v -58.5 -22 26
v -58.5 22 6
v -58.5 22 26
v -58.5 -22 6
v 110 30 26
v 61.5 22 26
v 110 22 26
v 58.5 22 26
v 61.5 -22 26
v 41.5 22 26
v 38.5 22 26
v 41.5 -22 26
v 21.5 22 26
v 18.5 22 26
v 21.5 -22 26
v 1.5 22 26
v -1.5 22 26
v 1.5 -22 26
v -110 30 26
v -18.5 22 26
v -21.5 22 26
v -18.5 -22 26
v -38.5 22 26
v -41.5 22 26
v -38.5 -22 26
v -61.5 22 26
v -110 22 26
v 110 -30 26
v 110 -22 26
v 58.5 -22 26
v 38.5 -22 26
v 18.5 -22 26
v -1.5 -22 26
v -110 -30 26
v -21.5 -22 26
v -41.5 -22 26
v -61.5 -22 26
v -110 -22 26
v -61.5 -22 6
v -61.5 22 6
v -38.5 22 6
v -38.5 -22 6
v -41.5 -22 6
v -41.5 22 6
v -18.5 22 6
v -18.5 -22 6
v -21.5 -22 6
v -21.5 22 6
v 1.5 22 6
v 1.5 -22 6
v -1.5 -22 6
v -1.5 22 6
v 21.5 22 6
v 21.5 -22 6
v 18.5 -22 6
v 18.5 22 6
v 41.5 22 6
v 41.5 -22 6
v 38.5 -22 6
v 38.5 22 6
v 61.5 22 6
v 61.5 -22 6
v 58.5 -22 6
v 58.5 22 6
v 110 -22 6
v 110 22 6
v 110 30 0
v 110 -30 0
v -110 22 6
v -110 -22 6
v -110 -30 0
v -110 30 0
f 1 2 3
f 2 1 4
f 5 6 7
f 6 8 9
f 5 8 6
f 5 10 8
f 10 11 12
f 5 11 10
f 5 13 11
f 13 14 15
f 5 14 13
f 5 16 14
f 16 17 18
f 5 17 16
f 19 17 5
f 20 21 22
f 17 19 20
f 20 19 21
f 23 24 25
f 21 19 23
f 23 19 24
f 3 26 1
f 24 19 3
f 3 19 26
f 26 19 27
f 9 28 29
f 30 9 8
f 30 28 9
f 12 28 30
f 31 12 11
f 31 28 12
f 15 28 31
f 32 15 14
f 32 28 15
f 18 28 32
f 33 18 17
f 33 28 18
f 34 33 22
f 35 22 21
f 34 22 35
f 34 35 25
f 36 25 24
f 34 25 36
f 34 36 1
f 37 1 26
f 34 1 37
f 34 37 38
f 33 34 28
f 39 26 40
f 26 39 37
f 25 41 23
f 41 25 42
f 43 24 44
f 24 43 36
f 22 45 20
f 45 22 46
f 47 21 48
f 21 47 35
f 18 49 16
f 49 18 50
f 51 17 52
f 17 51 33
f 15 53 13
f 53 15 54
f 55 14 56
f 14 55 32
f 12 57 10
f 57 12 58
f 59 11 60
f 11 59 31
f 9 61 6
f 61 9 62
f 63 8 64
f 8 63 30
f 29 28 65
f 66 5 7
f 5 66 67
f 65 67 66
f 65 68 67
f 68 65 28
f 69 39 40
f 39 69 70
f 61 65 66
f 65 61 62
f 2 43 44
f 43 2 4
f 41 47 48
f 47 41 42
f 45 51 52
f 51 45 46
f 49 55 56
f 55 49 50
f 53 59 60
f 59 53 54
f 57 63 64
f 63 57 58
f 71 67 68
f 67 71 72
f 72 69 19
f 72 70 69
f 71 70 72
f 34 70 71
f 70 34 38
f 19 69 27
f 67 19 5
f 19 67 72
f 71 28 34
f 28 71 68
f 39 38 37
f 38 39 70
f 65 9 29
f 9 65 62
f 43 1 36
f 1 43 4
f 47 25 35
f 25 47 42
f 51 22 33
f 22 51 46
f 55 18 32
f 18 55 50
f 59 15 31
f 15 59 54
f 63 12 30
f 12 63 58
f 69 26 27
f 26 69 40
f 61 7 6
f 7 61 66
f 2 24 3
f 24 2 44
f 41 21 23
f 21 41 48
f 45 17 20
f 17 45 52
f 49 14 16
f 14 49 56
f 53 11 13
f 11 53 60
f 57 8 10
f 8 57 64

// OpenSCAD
$fn = 32;

// ----------------------------------------------------------------------
// Rib frame 220 x 60 x 26
// 7 ribs at 20 mm pitch
// ----------------------------------------------------------------------

// --- parameters (mm) ---
frame = [220, 60, 6];  // base plate size (x, y, z)
rail_w = 8;            // side rail width
ribs = 7;              // number of ribs
rib_t = 3;             // rib thickness
rib_h = 20;            // rib height above the base plate
pitch = 20;            // pitch between rib centres

// --- derived feature positions (mm) ---
span = (ribs - 1) * pitch;          // = 120   distance between the outer ribs
origin_x = -span / 2;               // = -60   X of the first rib
rib_len = frame[1] - 2 * rail_w + 2;  // = 46   rib length, 1 mm into each rail
feature_centers = [
  [origin_x + 0 * pitch, 0],
  [origin_x + 1 * pitch, 0],
  [origin_x + 2 * pitch, 0],
  [origin_x + 3 * pitch, 0],
  [origin_x + 4 * pitch, 0],
  [origin_x + 5 * pitch, 0],
  [origin_x + 6 * pitch, 0]
];   // rib centre line, drives the rib loop

// base plate, two side rails, then the ribs read straight off feature_centers
union() {
  translate([-frame[0] / 2, -frame[1] / 2, 0]) cube(frame);
  translate([-frame[0] / 2, -frame[1] / 2, 0]) cube([frame[0], rail_w, frame[2] + rib_h]);
  translate([-frame[0] / 2, frame[1] / 2 - rail_w, 0]) cube([frame[0], rail_w, frame[2] + rib_h]);
  for (centre = feature_centers)
    translate([centre[0] - rib_t / 2, centre[1] - rib_len / 2, frame[2] - 1])
      cube([rib_t, rib_len, rib_h + 1]);
}
